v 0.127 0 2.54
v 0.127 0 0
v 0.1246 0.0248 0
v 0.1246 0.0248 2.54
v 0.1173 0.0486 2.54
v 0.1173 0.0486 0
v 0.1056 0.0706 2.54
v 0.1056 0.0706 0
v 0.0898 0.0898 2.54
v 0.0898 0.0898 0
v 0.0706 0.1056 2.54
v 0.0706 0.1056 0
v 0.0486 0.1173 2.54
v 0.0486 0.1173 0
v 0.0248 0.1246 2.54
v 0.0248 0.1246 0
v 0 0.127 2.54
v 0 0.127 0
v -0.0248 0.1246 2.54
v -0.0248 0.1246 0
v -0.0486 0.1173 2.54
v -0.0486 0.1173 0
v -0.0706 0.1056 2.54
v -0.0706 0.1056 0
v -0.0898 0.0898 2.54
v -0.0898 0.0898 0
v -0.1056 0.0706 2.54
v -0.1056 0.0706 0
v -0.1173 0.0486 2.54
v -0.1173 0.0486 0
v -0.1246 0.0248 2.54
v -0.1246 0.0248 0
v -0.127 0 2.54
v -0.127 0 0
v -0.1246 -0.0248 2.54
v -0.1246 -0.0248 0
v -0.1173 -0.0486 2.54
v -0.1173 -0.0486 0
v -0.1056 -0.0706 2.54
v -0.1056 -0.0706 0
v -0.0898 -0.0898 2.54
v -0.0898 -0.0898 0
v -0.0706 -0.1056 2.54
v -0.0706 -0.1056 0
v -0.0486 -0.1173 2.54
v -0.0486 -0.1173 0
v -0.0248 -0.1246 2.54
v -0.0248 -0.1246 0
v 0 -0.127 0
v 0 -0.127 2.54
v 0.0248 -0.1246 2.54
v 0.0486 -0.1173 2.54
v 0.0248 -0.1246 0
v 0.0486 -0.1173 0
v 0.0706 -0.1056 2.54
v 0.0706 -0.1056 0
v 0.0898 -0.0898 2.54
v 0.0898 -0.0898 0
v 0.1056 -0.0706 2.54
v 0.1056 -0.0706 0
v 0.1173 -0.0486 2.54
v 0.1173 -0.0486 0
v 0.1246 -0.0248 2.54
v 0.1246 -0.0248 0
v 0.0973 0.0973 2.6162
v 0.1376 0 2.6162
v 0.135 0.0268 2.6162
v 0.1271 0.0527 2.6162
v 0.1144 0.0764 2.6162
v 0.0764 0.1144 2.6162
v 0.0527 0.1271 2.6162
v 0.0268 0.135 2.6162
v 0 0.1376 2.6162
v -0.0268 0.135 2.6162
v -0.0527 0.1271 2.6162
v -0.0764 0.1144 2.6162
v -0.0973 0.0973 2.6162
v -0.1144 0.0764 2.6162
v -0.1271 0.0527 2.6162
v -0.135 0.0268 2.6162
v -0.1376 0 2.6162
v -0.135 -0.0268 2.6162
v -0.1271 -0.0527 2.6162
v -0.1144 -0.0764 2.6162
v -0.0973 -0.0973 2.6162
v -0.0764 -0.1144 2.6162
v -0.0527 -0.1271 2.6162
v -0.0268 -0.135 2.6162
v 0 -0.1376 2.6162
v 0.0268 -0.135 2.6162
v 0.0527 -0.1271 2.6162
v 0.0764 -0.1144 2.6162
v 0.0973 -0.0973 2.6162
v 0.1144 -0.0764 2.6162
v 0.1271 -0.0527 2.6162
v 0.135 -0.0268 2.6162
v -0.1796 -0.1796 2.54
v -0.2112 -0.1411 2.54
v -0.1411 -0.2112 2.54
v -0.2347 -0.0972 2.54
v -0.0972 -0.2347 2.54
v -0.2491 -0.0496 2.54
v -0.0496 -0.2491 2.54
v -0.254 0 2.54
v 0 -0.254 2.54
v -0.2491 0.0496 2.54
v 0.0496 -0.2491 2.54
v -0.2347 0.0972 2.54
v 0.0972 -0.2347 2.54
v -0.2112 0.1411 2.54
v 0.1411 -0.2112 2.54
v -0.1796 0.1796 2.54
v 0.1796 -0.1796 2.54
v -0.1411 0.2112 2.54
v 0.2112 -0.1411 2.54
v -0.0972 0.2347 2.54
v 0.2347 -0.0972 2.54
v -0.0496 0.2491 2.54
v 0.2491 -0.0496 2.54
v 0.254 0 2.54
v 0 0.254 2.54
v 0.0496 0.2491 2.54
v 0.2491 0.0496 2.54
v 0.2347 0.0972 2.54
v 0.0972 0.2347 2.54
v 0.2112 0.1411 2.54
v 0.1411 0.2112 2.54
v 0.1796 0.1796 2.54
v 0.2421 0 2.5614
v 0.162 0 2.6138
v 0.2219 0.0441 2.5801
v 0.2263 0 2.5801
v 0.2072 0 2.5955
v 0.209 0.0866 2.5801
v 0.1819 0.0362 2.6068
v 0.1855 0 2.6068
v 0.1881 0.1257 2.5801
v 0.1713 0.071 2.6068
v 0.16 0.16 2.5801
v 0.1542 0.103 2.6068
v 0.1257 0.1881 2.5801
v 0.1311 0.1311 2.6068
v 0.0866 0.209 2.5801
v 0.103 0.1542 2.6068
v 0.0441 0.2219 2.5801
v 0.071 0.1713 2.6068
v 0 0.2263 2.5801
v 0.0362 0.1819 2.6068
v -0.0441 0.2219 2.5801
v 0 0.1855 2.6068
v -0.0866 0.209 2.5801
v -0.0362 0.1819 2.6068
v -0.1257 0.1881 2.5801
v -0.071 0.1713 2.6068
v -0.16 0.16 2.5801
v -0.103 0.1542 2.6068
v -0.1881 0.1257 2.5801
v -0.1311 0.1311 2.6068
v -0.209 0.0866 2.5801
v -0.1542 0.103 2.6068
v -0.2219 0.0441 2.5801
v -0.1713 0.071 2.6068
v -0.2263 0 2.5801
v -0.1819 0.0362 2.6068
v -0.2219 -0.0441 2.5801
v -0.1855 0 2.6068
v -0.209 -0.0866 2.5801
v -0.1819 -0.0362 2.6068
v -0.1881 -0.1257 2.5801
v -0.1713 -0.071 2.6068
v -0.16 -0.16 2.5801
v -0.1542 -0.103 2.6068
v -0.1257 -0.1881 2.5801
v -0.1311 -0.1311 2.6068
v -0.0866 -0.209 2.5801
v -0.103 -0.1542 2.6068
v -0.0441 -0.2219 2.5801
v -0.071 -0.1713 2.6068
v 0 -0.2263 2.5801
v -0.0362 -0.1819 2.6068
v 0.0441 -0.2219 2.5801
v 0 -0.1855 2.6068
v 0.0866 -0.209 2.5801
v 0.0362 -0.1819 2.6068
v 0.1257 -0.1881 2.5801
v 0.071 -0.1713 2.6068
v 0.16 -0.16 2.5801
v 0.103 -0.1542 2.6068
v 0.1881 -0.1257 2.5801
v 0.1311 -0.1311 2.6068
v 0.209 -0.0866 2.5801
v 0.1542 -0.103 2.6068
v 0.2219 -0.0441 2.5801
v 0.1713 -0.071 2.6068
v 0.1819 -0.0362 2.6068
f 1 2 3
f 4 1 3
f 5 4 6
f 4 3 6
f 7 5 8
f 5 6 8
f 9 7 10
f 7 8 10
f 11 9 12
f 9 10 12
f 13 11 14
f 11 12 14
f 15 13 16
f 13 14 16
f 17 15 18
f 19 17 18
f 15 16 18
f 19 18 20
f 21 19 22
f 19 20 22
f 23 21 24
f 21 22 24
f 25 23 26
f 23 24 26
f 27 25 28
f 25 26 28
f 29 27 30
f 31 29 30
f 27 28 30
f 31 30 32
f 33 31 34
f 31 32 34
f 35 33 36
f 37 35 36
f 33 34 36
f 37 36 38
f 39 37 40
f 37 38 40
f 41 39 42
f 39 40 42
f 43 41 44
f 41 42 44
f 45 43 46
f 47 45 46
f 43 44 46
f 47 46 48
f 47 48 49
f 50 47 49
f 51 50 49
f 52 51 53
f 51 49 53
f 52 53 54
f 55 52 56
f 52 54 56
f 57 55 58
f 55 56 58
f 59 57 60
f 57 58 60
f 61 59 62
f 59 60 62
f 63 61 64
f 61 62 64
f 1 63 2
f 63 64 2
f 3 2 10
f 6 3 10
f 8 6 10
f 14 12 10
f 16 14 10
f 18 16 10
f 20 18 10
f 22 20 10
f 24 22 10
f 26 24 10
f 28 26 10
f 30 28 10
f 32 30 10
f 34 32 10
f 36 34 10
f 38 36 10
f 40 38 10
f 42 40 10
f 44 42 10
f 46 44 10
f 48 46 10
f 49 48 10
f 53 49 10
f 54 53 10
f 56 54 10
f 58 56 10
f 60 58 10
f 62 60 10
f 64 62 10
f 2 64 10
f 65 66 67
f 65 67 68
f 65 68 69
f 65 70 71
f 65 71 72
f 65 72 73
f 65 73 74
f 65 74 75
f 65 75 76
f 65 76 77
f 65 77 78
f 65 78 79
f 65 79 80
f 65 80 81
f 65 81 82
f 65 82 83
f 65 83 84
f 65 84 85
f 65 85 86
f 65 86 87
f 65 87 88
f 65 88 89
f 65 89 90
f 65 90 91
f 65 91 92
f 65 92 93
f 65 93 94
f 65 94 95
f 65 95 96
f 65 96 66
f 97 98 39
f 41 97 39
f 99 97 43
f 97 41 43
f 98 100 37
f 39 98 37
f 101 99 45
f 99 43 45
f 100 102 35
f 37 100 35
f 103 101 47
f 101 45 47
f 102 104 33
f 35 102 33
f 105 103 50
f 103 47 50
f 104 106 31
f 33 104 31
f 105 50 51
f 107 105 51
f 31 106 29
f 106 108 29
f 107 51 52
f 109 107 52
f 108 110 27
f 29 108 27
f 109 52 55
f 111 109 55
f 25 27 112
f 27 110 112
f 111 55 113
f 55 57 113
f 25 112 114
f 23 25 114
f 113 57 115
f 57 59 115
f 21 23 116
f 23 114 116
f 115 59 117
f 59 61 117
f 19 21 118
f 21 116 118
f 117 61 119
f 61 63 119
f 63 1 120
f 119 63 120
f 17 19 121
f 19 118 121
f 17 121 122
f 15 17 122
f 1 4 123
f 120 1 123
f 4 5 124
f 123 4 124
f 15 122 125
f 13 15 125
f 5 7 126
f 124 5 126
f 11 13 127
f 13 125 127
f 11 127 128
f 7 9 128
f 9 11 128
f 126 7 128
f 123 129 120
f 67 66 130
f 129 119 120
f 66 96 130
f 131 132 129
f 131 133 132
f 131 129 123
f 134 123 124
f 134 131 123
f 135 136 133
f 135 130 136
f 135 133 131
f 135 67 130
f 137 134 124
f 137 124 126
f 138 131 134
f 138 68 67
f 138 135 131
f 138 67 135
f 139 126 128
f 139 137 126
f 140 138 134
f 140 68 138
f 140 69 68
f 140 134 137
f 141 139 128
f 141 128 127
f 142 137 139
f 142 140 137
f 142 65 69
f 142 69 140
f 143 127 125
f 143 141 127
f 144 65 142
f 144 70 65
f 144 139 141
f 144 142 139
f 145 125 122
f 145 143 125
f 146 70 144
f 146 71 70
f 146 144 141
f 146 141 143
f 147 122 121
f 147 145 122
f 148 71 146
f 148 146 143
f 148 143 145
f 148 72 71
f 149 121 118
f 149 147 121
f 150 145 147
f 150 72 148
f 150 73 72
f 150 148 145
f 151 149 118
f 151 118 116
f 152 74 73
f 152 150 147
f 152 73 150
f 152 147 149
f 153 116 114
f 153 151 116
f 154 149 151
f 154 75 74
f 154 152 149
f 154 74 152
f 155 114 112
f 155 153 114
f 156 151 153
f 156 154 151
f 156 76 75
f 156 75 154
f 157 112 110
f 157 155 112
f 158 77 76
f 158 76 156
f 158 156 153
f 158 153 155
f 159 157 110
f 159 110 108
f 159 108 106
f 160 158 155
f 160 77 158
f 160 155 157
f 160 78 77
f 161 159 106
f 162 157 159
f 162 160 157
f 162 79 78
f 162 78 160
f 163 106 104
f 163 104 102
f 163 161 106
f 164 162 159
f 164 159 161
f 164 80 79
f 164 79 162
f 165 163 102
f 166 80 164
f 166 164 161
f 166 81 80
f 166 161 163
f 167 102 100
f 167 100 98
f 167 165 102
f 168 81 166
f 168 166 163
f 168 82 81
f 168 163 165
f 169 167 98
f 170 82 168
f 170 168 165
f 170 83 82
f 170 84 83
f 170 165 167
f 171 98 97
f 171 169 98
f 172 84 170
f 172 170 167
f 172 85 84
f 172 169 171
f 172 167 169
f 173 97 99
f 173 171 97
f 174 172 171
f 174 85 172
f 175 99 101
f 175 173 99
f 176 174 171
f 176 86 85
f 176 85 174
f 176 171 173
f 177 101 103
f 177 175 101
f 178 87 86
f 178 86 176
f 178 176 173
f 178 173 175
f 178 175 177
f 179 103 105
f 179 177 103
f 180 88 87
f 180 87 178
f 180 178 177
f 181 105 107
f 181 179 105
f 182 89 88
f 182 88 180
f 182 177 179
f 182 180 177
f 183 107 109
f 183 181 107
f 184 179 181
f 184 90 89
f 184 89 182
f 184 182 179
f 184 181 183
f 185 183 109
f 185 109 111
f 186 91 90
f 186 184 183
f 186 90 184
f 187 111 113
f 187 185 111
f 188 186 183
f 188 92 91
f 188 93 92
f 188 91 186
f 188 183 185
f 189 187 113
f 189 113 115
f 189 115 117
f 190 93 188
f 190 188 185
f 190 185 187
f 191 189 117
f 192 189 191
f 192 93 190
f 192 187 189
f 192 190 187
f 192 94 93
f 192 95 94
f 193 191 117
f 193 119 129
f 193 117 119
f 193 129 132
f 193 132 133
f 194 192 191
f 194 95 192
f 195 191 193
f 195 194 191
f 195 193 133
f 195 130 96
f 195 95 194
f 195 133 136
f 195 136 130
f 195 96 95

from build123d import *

# Parameters (mm, degrees)
F0_R     = 0.127
F1_DEPTH = 2.54
F2_R     = 0.254
F2_R_2   = 0.127
F3_DEPTH = 0.0762
F4_DEPTH = 0.0762


# Not quite as in the source:
# - a fillet or chamfer that OpenCascade refuses, or shapes differently, is made with other operations: its cross-section is extruded or revolved along the edge and cut away or added


with BuildPart() as f1:
    # F0 (on Top) → F1 (new body)
    with BuildSketch(Plane.XY):
        Circle(F0_R)
    extrude(amount=F1_DEPTH)

    # F2 (on face) → F3 (join)
    with BuildSketch(Plane.XY.offset(2.54)):
        Circle(F2_R)
        Circle(F2_R_2, mode=Mode.SUBTRACT)
    extrude(amount=F3_DEPTH)

    # F4 (add): a face of the model
    f4_faces = [f1.faces().sort_by_distance(p)[0] for p in [
        (0, 0, 2.54),
    ]]
    extrude(f4_faces, amount=F4_DEPTH)

    # F5: fillet of radius 0.127 on 1 edges, made by hand

    # F5_s1 → F5_t2 (revolve, cut)
    with BuildSketch(Plane.XZ):
        with BuildLine():
            ThreePointArc((0.254, 2.54), (0.2071633422, 2.5954558234), (0.1376025773, 2.6162))
            Line((0.1376025773, 2.6162), (0.254, 2.6162))
            Line((0.254, 2.6162), (0.254, 2.54))
        make_face()
    revolve(axis=Axis((0, 0, 2.6162), (0, 0, 1)), mode=Mode.SUBTRACT)


solid = f1.part
